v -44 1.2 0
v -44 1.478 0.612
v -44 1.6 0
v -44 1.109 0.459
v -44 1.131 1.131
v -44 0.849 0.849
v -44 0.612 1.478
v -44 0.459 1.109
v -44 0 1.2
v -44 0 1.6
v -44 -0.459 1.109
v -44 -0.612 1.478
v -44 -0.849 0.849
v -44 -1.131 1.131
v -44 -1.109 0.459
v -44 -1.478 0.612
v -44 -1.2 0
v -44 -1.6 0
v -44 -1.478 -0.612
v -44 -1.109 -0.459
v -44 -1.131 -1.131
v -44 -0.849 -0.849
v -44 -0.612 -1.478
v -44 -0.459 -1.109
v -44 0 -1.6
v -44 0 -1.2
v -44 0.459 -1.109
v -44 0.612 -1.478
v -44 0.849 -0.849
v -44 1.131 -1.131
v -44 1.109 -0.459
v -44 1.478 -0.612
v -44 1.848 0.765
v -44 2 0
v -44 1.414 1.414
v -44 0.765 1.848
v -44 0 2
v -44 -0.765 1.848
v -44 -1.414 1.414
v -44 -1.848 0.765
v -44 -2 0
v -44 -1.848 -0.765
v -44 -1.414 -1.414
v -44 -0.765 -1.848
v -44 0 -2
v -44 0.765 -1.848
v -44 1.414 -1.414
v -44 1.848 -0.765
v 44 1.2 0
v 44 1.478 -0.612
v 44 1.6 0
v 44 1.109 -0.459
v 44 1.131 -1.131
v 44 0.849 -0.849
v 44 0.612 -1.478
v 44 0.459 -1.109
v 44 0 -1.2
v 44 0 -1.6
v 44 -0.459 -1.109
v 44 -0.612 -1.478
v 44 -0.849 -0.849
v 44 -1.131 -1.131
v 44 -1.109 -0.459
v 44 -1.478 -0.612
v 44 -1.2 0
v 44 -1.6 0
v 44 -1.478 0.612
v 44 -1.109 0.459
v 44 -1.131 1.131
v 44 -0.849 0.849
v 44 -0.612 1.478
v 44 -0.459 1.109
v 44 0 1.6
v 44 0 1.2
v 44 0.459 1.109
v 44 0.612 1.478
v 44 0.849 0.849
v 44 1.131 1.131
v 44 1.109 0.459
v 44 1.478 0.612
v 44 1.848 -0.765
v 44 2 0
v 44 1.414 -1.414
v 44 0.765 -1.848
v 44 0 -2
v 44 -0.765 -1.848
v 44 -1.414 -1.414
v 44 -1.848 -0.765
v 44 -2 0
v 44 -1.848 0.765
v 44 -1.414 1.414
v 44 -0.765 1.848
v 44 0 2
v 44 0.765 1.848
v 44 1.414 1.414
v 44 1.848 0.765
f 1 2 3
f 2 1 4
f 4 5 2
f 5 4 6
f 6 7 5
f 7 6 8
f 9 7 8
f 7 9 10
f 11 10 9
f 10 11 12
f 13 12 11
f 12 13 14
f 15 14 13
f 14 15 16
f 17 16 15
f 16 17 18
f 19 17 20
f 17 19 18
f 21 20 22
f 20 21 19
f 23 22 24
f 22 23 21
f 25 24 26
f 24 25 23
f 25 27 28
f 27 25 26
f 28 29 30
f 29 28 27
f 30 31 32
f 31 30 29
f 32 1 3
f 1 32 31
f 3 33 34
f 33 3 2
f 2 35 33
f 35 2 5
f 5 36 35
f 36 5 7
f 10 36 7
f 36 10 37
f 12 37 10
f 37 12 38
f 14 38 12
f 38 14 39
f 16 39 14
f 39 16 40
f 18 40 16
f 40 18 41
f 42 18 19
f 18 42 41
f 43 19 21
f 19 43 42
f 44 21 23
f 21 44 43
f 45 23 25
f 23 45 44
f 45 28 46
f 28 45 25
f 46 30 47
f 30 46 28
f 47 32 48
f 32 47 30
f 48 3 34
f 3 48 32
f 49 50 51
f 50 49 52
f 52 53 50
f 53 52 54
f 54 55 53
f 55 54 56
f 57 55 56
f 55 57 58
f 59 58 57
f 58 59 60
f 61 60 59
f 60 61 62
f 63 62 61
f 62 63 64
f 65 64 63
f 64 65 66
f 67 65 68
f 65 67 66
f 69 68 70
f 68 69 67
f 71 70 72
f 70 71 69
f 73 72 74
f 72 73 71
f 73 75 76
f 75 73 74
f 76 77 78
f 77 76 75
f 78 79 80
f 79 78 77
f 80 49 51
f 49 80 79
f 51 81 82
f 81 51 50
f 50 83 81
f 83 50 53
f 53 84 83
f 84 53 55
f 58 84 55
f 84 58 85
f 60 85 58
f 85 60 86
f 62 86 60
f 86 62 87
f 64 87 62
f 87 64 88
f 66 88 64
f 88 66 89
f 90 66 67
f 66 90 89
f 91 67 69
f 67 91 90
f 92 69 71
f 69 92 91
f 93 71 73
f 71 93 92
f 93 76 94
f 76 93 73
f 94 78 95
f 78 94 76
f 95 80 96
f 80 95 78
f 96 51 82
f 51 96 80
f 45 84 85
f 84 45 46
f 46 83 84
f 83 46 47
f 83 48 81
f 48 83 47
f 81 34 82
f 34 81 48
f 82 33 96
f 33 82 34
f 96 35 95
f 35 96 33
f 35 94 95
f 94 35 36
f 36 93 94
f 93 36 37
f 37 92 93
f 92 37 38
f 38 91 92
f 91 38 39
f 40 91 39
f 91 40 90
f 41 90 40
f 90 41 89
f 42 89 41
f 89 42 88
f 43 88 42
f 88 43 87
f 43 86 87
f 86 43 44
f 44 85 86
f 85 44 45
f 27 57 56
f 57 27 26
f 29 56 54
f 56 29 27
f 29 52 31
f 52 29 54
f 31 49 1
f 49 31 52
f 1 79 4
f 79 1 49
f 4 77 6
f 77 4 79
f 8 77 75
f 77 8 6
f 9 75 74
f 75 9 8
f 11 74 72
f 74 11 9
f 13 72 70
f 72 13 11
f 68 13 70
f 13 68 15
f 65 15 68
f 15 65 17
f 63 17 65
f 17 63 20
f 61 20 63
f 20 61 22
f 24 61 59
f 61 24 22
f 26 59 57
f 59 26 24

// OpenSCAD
// file: ../p/4-4cyli.scad
use <../lib.scad>
function ldraw_lib__4_4cyli() = [
// 0 Cylinder 1.0
// 0 Name: 4-4cyli.dat
// 0 Author: James Jessiman
// 0 !LDRAW_ORG Primitive UPDATE 2005-01
// 0 !LICENSE Licensed under CC BY 4.0 : see CAreadme.txt
// 
// 0 BFC CERTIFY CCW
  [0,"BFC","CERTIFY"],
  [0,"BFC","CCW"],
// 
// 0 !HISTORY 1998-12-15 [PTadmin] Official Update 1998-10
// 0 !HISTORY 2002-03-23 [sbliss] Added BFC statement; merged headers from files in distributions LDraw 0.27 and Complete.
// 0 !HISTORY 2002-04-25 [PTadmin] Official Update 2002-02
// 0 !HISTORY 2004-12-14 [guyvivan] BFC CCW
// 0 !HISTORY 2005-12-28 [PTadmin] Official Update 2005-01
// 0 !HISTORY 2007-06-24 [PTadmin] Header formatted for Contributor Agreement
// 0 !HISTORY 2008-07-01 [PTadmin] Official Update 2008-01
// 
// 
// 4 16 1 1 0 0.9239 1 0.3827 0.9239 0 0.3827 1 0 0
  [4,16,1,1,0,0.9239,1,0.3827,0.9239,0,0.3827,1,0,0],
// 5 24 1 0 0 1 1 0 0.9239 0 0.3827 0.9239 0 -0.3827
  [5,24,1,0,0,1,1,0,0.9239,0,0.3827,0.9239,0,-0.3827],
// 4 16 0.9239 1 0.3827 0.7071 1 0.7071 0.7071 0 0.7071 0.9239 0 0.3827
  [4,16,0.9239,1,0.3827,0.7071,1,0.7071,0.7071,0,0.7071,0.9239,0,0.3827],
// 5 24 0.9239 0 0.3827 0.9239 1 0.3827 0.7071 0 0.7071 1 0 0
  [5,24,0.9239,0,0.3827,0.9239,1,0.3827,0.7071,0,0.7071,1,0,0],
// 4 16 0.7071 1 0.7071 0.3827 1 0.9239 0.3827 0 0.9239 0.7071 0 0.7071
  [4,16,0.7071,1,0.7071,0.3827,1,0.9239,0.3827,0,0.9239,0.7071,0,0.7071],
// 5 24 0.7071 0 0.7071 0.7071 1 0.7071 0.3827 0 0.9239 0.9239 0 0.3827
  [5,24,0.7071,0,0.7071,0.7071,1,0.7071,0.3827,0,0.9239,0.9239,0,0.3827],
// 4 16 0.3827 1 0.9239 0 1 1 0 0 1 0.3827 0 0.9239
  [4,16,0.3827,1,0.9239,0,1,1,0,0,1,0.3827,0,0.9239],
// 5 24 0.3827 0 0.9239 0.3827 1 0.9239 0 0 1 0.7071 0 0.7071
  [5,24,0.3827,0,0.9239,0.3827,1,0.9239,0,0,1,0.7071,0,0.7071],
// 4 16 0 1 1 -0.3827 1 0.9239 -0.3827 0 0.9239 0 0 1
  [4,16,0,1,1,-0.3827,1,0.9239,-0.3827,0,0.9239,0,0,1],
// 5 24 0 0 1 0 1 1 -0.3827 0 0.9239 0.3827 0 0.9239
  [5,24,0,0,1,0,1,1,-0.3827,0,0.9239,0.3827,0,0.9239],
// 4 16 -0.3827 1 0.9239 -0.7071 1 0.7071 -0.7071 0 0.7071 -0.3827 0 0.9239
  [4,16,-0.3827,1,0.9239,-0.7071,1,0.7071,-0.7071,0,0.7071,-0.3827,0,0.9239],
// 5 24 -0.3827 0 0.9239 -0.3827 1 0.9239 -0.7071 0 0.7071 0 0 1
  [5,24,-0.3827,0,0.9239,-0.3827,1,0.9239,-0.7071,0,0.7071,0,0,1],
// 4 16 -0.7071 1 0.7071 -0.9239 1 0.3827 -0.9239 0 0.3827 -0.7071 0 0.7071
  [4,16,-0.7071,1,0.7071,-0.9239,1,0.3827,-0.9239,0,0.3827,-0.7071,0,0.7071],
// 5 24 -0.7071 0 0.7071 -0.7071 1 0.7071 -0.9239 0 0.3827 -0.3827 0 0.9239
  [5,24,-0.7071,0,0.7071,-0.7071,1,0.7071,-0.9239,0,0.3827,-0.3827,0,0.9239],
// 4 16 -0.9239 1 0.3827 -1 1 0 -1 0 0 -0.9239 0 0.3827
  [4,16,-0.9239,1,0.3827,-1,1,0,-1,0,0,-0.9239,0,0.3827],
// 5 24 -0.9239 0 0.3827 -0.9239 1 0.3827 -1 0 0 -0.7071 0 0.7071
  [5,24,-0.9239,0,0.3827,-0.9239,1,0.3827,-1,0,0,-0.7071,0,0.7071],
// 4 16 -1 1 0 -0.9239 1 -0.3827 -0.9239 0 -0.3827 -1 0 0
  [4,16,-1,1,0,-0.9239,1,-0.3827,-0.9239,0,-0.3827,-1,0,0],
// 5 24 -1 0 0 -1 1 0 -0.9239 0 -0.3827 -0.9239 0 0.3827
  [5,24,-1,0,0,-1,1,0,-0.9239,0,-0.3827,-0.9239,0,0.3827],
// 4 16 -0.9239 1 -0.3827 -0.7071 1 -0.7071 -0.7071 0 -0.7071 -0.9239 0 -0.3827
  [4,16,-0.9239,1,-0.3827,-0.7071,1,-0.7071,-0.7071,0,-0.7071,-0.9239,0,-0.3827],
// 5 24 -0.9239 0 -0.3827 -0.9239 1 -0.3827 -0.7071 0 -0.7071 -1 0 0
  [5,24,-0.9239,0,-0.3827,-0.9239,1,-0.3827,-0.7071,0,-0.7071,-1,0,0],
// 4 16 -0.7071 1 -0.7071 -0.3827 1 -0.9239 -0.3827 0 -0.9239 -0.7071 0 -0.7071
  [4,16,-0.7071,1,-0.7071,-0.3827,1,-0.9239,-0.3827,0,-0.9239,-0.7071,0,-0.7071],
// 5 24 -0.7071 0 -0.7071 -0.7071 1 -0.7071 -0.3827 0 -0.9239 -0.9239 0 -0.3827
  [5,24,-0.7071,0,-0.7071,-0.7071,1,-0.7071,-0.3827,0,-0.9239,-0.9239,0,-0.3827],
// 4 16 -0.3827 1 -0.9239 0 1 -1 0 0 -1 -0.3827 0 -0.9239
  [4,16,-0.3827,1,-0.9239,0,1,-1,0,0,-1,-0.3827,0,-0.9239],
// 5 24 -0.3827 0 -0.9239 -0.3827 1 -0.9239 0 0 -1 -0.7071 0 -0.7071
  [5,24,-0.3827,0,-0.9239,-0.3827,1,-0.9239,0,0,-1,-0.7071,0,-0.7071],
// 4 16 0 1 -1 0.3827 1 -0.9239 0.3827 0 -0.9239 0 0 -1
  [4,16,0,1,-1,0.3827,1,-0.9239,0.3827,0,-0.9239,0,0,-1],
// 5 24 0 0 -1 0 1 -1 0.3827 0 -0.9239 -0.3827 0 -0.9239
  [5,24,0,0,-1,0,1,-1,0.3827,0,-0.9239,-0.3827,0,-0.9239],
// 4 16 0.3827 1 -0.9239 0.7071 1 -0.7071 0.7071 0 -0.7071 0.3827 0 -0.9239
  [4,16,0.3827,1,-0.9239,0.7071,1,-0.7071,0.7071,0,-0.7071,0.3827,0,-0.9239],
// 5 24 0.3827 0 -0.9239 0.3827 1 -0.9239 0.7071 0 -0.7071 0 0 -1
  [5,24,0.3827,0,-0.9239,0.3827,1,-0.9239,0.7071,0,-0.7071,0,0,-1],
// 4 16 0.7071 1 -0.7071 0.9239 1 -0.3827 0.9239 0 -0.3827 0.7071 0 -0.7071
  [4,16,0.7071,1,-0.7071,0.9239,1,-0.3827,0.9239,0,-0.3827,0.7071,0,-0.7071],
// 5 24 0.7071 0 -0.7071 0.7071 1 -0.7071 0.9239 0 -0.3827 0.3827 0 -0.9239
  [5,24,0.7071,0,-0.7071,0.7071,1,-0.7071,0.9239,0,-0.3827,0.3827,0,-0.9239],
// 4 16 0.9239 1 -0.3827 1 1 0 1 0 0 0.9239 0 -0.3827
  [4,16,0.9239,1,-0.3827,1,1,0,1,0,0,0.9239,0,-0.3827],
// 5 24 0.9239 0 -0.3827 0.9239 1 -0.3827 1 0 0 0.7071 0 -0.7071
  [5,24,0.9239,0,-0.3827,0.9239,1,-0.3827,1,0,0,0.7071,0,-0.7071],
// 0
];
module ldraw_lib__4_4cyli(step=0, col=false, unit=2/5, alt=false, line=0.2, solid=!$preview)
    makepoly(ldraw_lib__4_4cyli(), step=step, col=col, unit=unit, alt=alt, line=line, solid=solid);
ldraw_lib__4_4cyli(line=0.2);
// file: ../p/4-4ring4.scad
use <../lib.scad>
function ldraw_lib__4_4ring4() = [
// 0 Ring  4 x 1.0
// 0 Name: 4-4ring4.dat
// 0 Author: James Jessiman
// 0 !LDRAW_ORG Primitive UPDATE 2009-01
// 0 !LICENSE Licensed under CC BY 4.0 : see CAreadme.txt
// 
// 0 BFC CERTIFY CCW
  [0,"BFC","CERTIFY"],
  [0,"BFC","CCW"],
// 
// 0 !HISTORY 1998-12-15 [PTadmin] Official Update 1998-10
// 0 !HISTORY 2002-04-08 [BrickCaster] Modified for BFC compliance
// 0 !HISTORY 2002-04-25 [PTadmin] Official Update 2002-02
// 0 !HISTORY 2007-06-24 [PTadmin] Header formatted for Contributor Agreement
// 0 !HISTORY 2008-07-01 [PTadmin] Official Update 2008-01
// 0 !HISTORY 2008-08-26 [cwdee] Switch polygon winding and rename
// 0 !HISTORY 2009-05-02 [PTadmin] Official Update 2009-01
// 
// 
// 4 16 -1.9135 0 4.6195 -1.5308 0 3.6956 0 0 4 0 0 5
  [4,16,-1.9135,0,4.6195,-1.5308,0,3.6956,0,0,4,0,0,5],
// 4 16 -3.5355 0 3.5355 -2.8284 0 2.8284 -1.5308 0 3.6956 -1.9135 0 4.6195
  [4,16,-3.5355,0,3.5355,-2.8284,0,2.8284,-1.5308,0,3.6956,-1.9135,0,4.6195],
// 4 16 -4.6195 0 1.9135 -3.6956 0 1.5308 -2.8284 0 2.8284 -3.5355 0 3.5355
  [4,16,-4.6195,0,1.9135,-3.6956,0,1.5308,-2.8284,0,2.8284,-3.5355,0,3.5355],
// 4 16 -5 0 0 -4 0 0 -3.6956 0 1.5308 -4.6195 0 1.9135
  [4,16,-5,0,0,-4,0,0,-3.6956,0,1.5308,-4.6195,0,1.9135],
// 4 16 -4.6195 0 -1.9135 -3.6956 0 -1.5308 -4 0 0 -5 0 0
  [4,16,-4.6195,0,-1.9135,-3.6956,0,-1.5308,-4,0,0,-5,0,0],
// 4 16 -3.5355 0 -3.5355 -2.8284 0 -2.8284 -3.6956 0 -1.5308 -4.6195 0 -1.9135
  [4,16,-3.5355,0,-3.5355,-2.8284,0,-2.8284,-3.6956,0,-1.5308,-4.6195,0,-1.9135],
// 4 16 -1.9135 0 -4.6195 -1.5308 0 -3.6956 -2.8284 0 -2.8284 -3.5355 0 -3.5355
  [4,16,-1.9135,0,-4.6195,-1.5308,0,-3.6956,-2.8284,0,-2.8284,-3.5355,0,-3.5355],
// 4 16 0 0 -5 0 0 -4 -1.5308 0 -3.6956 -1.9135 0 -4.6195
  [4,16,0,0,-5,0,0,-4,-1.5308,0,-3.6956,-1.9135,0,-4.6195],
// 4 16 1.9135 0 -4.6195 1.5308 0 -3.6956 0 0 -4 0 0 -5
  [4,16,1.9135,0,-4.6195,1.5308,0,-3.6956,0,0,-4,0,0,-5],
// 4 16 3.5355 0 -3.5355 2.8284 0 -2.8284 1.5308 0 -3.6956 1.9135 0 -4.6195
  [4,16,3.5355,0,-3.5355,2.8284,0,-2.8284,1.5308,0,-3.6956,1.9135,0,-4.6195],
// 4 16 4.6195 0 -1.9135 3.6956 0 -1.5308 2.8284 0 -2.8284 3.5355 0 -3.5355
  [4,16,4.6195,0,-1.9135,3.6956,0,-1.5308,2.8284,0,-2.8284,3.5355,0,-3.5355],
// 4 16 5 0 0 4 0 0 3.6956 0 -1.5308 4.6195 0 -1.9135
  [4,16,5,0,0,4,0,0,3.6956,0,-1.5308,4.6195,0,-1.9135],
// 4 16 4.6195 0 1.9135 3.6956 0 1.5308 4 0 0 5 0 0
  [4,16,4.6195,0,1.9135,3.6956,0,1.5308,4,0,0,5,0,0],
// 4 16 3.5355 0 3.5355 2.8284 0 2.8284 3.6956 0 1.5308 4.6195 0 1.9135
  [4,16,3.5355,0,3.5355,2.8284,0,2.8284,3.6956,0,1.5308,4.6195,0,1.9135],
// 4 16 1.9135 0 4.6195 1.5308 0 3.6956 2.8284 0 2.8284 3.5355 0 3.5355
  [4,16,1.9135,0,4.6195,1.5308,0,3.6956,2.8284,0,2.8284,3.5355,0,3.5355],
// 4 16 0 0 5 0 0 4 1.5308 0 3.6956 1.9135 0 4.6195
  [4,16,0,0,5,0,0,4,1.5308,0,3.6956,1.9135,0,4.6195],
// 0
];
module ldraw_lib__4_4ring4(step=0, col=false, unit=2/5, alt=false, line=0.2, solid=!$preview)
    makepoly(ldraw_lib__4_4ring4(), step=step, col=col, unit=unit, alt=alt, line=line, solid=solid);
ldraw_lib__4_4ring4(line=0.2);
// file: ../p/4-4ring3.scad
use <../lib.scad>
function ldraw_lib__4_4ring3() = [
// 0 Ring  3 x 1.0
// 0 Name: 4-4ring3.dat
// 0 Author: James Jessiman
// 0 !LDRAW_ORG Primitive UPDATE 2009-01
// 0 !LICENSE Licensed under CC BY 4.0 : see CAreadme.txt
// 
// 0 BFC CERTIFY CCW
  [0,"BFC","CERTIFY"],
  [0,"BFC","CCW"],
// 
// 0 !HISTORY 1998-12-15 [PTadmin] Official Update 1998-10
// 0 !HISTORY 2002-04-05 [hafhead] Added BFC statement
// 0 !HISTORY 2002-04-25 [PTadmin] Official Update 2002-02
// 0 !HISTORY 2007-06-24 [PTadmin] Header formatted for Contributor Agreement
// 0 !HISTORY 2008-07-01 [PTadmin] Official Update 2008-01
// 0 !HISTORY 2008-08-26 [cwdee] Switch polygon winding and rename
// 0 !HISTORY 2009-05-02 [PTadmin] Official Update 2009-01
// 
// 
// 4 16 -1.5308 0 3.6956 -1.1481 0 2.7717 0 0 3 0 0 4
  [4,16,-1.5308,0,3.6956,-1.1481,0,2.7717,0,0,3,0,0,4],
// 4 16 -2.8284 0 2.8284 -2.1213 0 2.1213 -1.1481 0 2.7717 -1.5308 0 3.6956
  [4,16,-2.8284,0,2.8284,-2.1213,0,2.1213,-1.1481,0,2.7717,-1.5308,0,3.6956],
// 4 16 -3.6956 0 1.5308 -2.7717 0 1.1481 -2.1213 0 2.1213 -2.8284 0 2.8284
  [4,16,-3.6956,0,1.5308,-2.7717,0,1.1481,-2.1213,0,2.1213,-2.8284,0,2.8284],
// 4 16 -4 0 0 -3 0 0 -2.7717 0 1.1481 -3.6956 0 1.5308
  [4,16,-4,0,0,-3,0,0,-2.7717,0,1.1481,-3.6956,0,1.5308],
// 4 16 -3.6956 0 -1.5308 -2.7717 0 -1.1481 -3 0 0 -4 0 0
  [4,16,-3.6956,0,-1.5308,-2.7717,0,-1.1481,-3,0,0,-4,0,0],
// 4 16 -2.8284 0 -2.8284 -2.1213 0 -2.1213 -2.7717 0 -1.1481 -3.6956 0 -1.5308
  [4,16,-2.8284,0,-2.8284,-2.1213,0,-2.1213,-2.7717,0,-1.1481,-3.6956,0,-1.5308],
// 4 16 -1.5308 0 -3.6956 -1.1481 0 -2.7717 -2.1213 0 -2.1213 -2.8284 0 -2.8284
  [4,16,-1.5308,0,-3.6956,-1.1481,0,-2.7717,-2.1213,0,-2.1213,-2.8284,0,-2.8284],
// 4 16 0 0 -4 0 0 -3 -1.1481 0 -2.7717 -1.5308 0 -3.6956
  [4,16,0,0,-4,0,0,-3,-1.1481,0,-2.7717,-1.5308,0,-3.6956],
// 4 16 1.5308 0 -3.6956 1.1481 0 -2.7717 0 0 -3 0 0 -4
  [4,16,1.5308,0,-3.6956,1.1481,0,-2.7717,0,0,-3,0,0,-4],
// 4 16 2.8284 0 -2.8284 2.1213 0 -2.1213 1.1481 0 -2.7717 1.5308 0 -3.6956
  [4,16,2.8284,0,-2.8284,2.1213,0,-2.1213,1.1481,0,-2.7717,1.5308,0,-3.6956],
// 4 16 3.6956 0 -1.5308 2.7717 0 -1.1481 2.1213 0 -2.1213 2.8284 0 -2.8284
  [4,16,3.6956,0,-1.5308,2.7717,0,-1.1481,2.1213,0,-2.1213,2.8284,0,-2.8284],
// 4 16 4 0 0 3 0 0 2.7717 0 -1.1481 3.6956 0 -1.5308
  [4,16,4,0,0,3,0,0,2.7717,0,-1.1481,3.6956,0,-1.5308],
// 4 16 3.6956 0 1.5308 2.7717 0 1.1481 3 0 0 4 0 0
  [4,16,3.6956,0,1.5308,2.7717,0,1.1481,3,0,0,4,0,0],
// 4 16 2.8284 0 2.8284 2.1213 0 2.1213 2.7717 0 1.1481 3.6956 0 1.5308
  [4,16,2.8284,0,2.8284,2.1213,0,2.1213,2.7717,0,1.1481,3.6956,0,1.5308],
// 4 16 1.5308 0 3.6956 1.1481 0 2.7717 2.1213 0 2.1213 2.8284 0 2.8284
  [4,16,1.5308,0,3.6956,1.1481,0,2.7717,2.1213,0,2.1213,2.8284,0,2.8284],
// 4 16 0 0 4 0 0 3 1.1481 0 2.7717 1.5308 0 3.6956
  [4,16,0,0,4,0,0,3,1.1481,0,2.7717,1.5308,0,3.6956],
// 0
];
module ldraw_lib__4_4ring3(step=0, col=false, unit=2/5, alt=false, line=0.2, solid=!$preview)
    makepoly(ldraw_lib__4_4ring3(), step=step, col=col, unit=unit, alt=alt, line=line, solid=solid);
ldraw_lib__4_4ring3(line=0.2);
// file: ../p/4-4edge.scad
use <../lib.scad>
function ldraw_lib__4_4edge() = [
// 0 Circle 1.0
// 0 Name: 4-4edge.dat
// 0 Author: James Jessiman
// 0 !LDRAW_ORG Primitive UPDATE 2017-01
// 0 !LICENSE Licensed under CC BY 4.0 : see CAreadme.txt
// 
// 0 BFC CERTIFY CCW
  [0,"BFC","CERTIFY"],
  [0,"BFC","CCW"],
// 
// 0 !HISTORY 1998-12-15 [PTadmin] Official Update 1998-10
// 0 !HISTORY 2005-12-28 [PTadmin] Official Update 2005-01
// 0 !HISTORY 2007-06-24 [PTadmin] Header formatted for Contributor Agreement
// 0 !HISTORY 2008-07-01 [PTadmin] Official Update 2008-01
// 0 !HISTORY 2017-01-15 [Steffen] BFCed
// 0 !HISTORY 2017-12-30 [PTadmin] Official Update 2017-01
// 
// 
// 2 24 1 0 0 0.9239 0 0.3827
  [2,24,1,0,0,0.9239,0,0.3827],
// 2 24 0.9239 0 0.3827 0.7071 0 0.7071
  [2,24,0.9239,0,0.3827,0.7071,0,0.7071],
// 2 24 0.7071 0 0.7071 0.3827 0 0.9239
  [2,24,0.7071,0,0.7071,0.3827,0,0.9239],
// 2 24 0.3827 0 0.9239 0 0 1
  [2,24,0.3827,0,0.9239,0,0,1],
// 2 24 0 0 1 -0.3827 0 0.9239
  [2,24,0,0,1,-0.3827,0,0.9239],
// 2 24 -0.3827 0 0.9239 -0.7071 0 0.7071
  [2,24,-0.3827,0,0.9239,-0.7071,0,0.7071],
// 2 24 -0.7071 0 0.7071 -0.9239 0 0.3827
  [2,24,-0.7071,0,0.7071,-0.9239,0,0.3827],
// 2 24 -0.9239 0 0.3827 -1 0 -0
  [2,24,-0.9239,0,0.3827,-1,0,-0],
// 2 24 -1 0 -0 -0.9239 0 -0.3827
  [2,24,-1,0,-0,-0.9239,0,-0.3827],
// 2 24 -0.9239 0 -0.3827 -0.7071 0 -0.7071
  [2,24,-0.9239,0,-0.3827,-0.7071,0,-0.7071],
// 2 24 -0.7071 0 -0.7071 -0.3827 0 -0.9239
  [2,24,-0.7071,0,-0.7071,-0.3827,0,-0.9239],
// 2 24 -0.3827 0 -0.9239 0 0 -1
  [2,24,-0.3827,0,-0.9239,0,0,-1],
// 2 24 0 0 -1 0.3827 0 -0.9239
  [2,24,0,0,-1,0.3827,0,-0.9239],
// 2 24 0.3827 0 -0.9239 0.7071 0 -0.7071
  [2,24,0.3827,0,-0.9239,0.7071,0,-0.7071],
// 2 24 0.7071 0 -0.7071 0.9239 0 -0.3827
  [2,24,0.7071,0,-0.7071,0.9239,0,-0.3827],
// 2 24 0.9239 0 -0.3827 1 0 0
  [2,24,0.9239,0,-0.3827,1,0,0],
];
module ldraw_lib__4_4edge(step=0, col=false, unit=2/5, alt=false, line=0.2, solid=!$preview)
    makepoly(ldraw_lib__4_4edge(), step=step, col=col, unit=unit, alt=alt, line=line, solid=solid);
ldraw_lib__4_4edge(line=0.2);
// file: 71533k03.scad
use <../lib.scad>
use <../p/4-4cyli.scad>
function ldraw_lib__71533k03() = [
// 0 ~Technic Pneumatic Tube Segment
// 0 Name: 71533k03.dat
// 0 Author: Jaco van der Molen [Jaco]
// 0 !LDRAW_ORG Part Flexible_Section UPDATE 2020-01
// 0 !LICENSE Licensed under CC BY 4.0 : see CAreadme.txt
// 
// 0 BFC CERTIFY CW
  [0,"BFC","CERTIFY"],
  [0,"BFC","CW"],
// 
// 0 !HISTORY 2003-11-30 [Steffen] BFCed
// 0 !HISTORY 2009-12-29 [PTadmin] Official Update 2009-03
// 0 !HISTORY 2020-06-27 [PTadmin] Renamed from 166
// 0 !HISTORY 2020-06-28 [PTadmin] Official Update 2020-01
// 
// 
// 1 16 0 0 0 5 0 0 0 1 0 0 0 5 4-4cyli.dat
  [1,16,0,0,0,5,0,0,0,1,0,0,0,5, ldraw_lib__4_4cyli()],
// 0 BFC INVERTNEXT
  [0,"BFC","INVERTNEXT"],
// 1 16 0 0 0 3 0 0 0 1 0 0 0 3 4-4cyli.dat
  [1,16,0,0,0,3,0,0,0,1,0,0,0,3, ldraw_lib__4_4cyli()],
// 0
];
module ldraw_lib__71533k03(step=0, col=false, unit=2/5, alt=false, line=0.2, solid=!$preview)
    makepoly(ldraw_lib__71533k03(), step=step, col=col, unit=unit, alt=alt, line=line, solid=solid);
ldraw_lib__71533k03(line=0.2);
// file: 71533k02.scad
use <../lib.scad>
use <../p/4-4edge.scad>
use <../p/4-4ring3.scad>
use <../p/4-4ring4.scad>
function ldraw_lib__71533k02() = [
// 0 ~Technic Pneumatic Tube End (Non-Bulged)
// 0 Name: 71533k02.dat
// 0 Author: Steffen [Steffen]
// 0 !LDRAW_ORG Part Flexible_Section UPDATE 2020-01
// 0 !LICENSE Licensed under CC BY 4.0 : see CAreadme.txt
// 
// 0 BFC CERTIFY CCW
  [0,"BFC","CERTIFY"],
  [0,"BFC","CCW"],
// 
// 0 !HISTORY 2020-06-28 [PTadmin] Official Update 2020-01
// 
// 
// 0 // This file goes together with 71533k01.dat and 71533k03.dat.
// 0 // Those 3 files can be used to create Technic Pneumatic Tubes
// 0 // with either bulged or non-bulged ends.
// 
// 1 16 0 0 0 1 0 0 0 1 0 0 0 1 4-4ring3.dat
  [1,16,0,0,0,1,0,0,0,1,0,0,0,1, ldraw_lib__4_4ring3()],
// 1 16 0 0 0 1 0 0 0 1 0 0 0 1 4-4ring4.dat
  [1,16,0,0,0,1,0,0,0,1,0,0,0,1, ldraw_lib__4_4ring4()],
// 1 16 0 0 0 3 0 0 0 3 0 0 0 3 4-4edge.dat
  [1,16,0,0,0,3,0,0,0,3,0,0,0,3, ldraw_lib__4_4edge()],
// 1 16 0 0 0 5 0 0 0 5 0 0 0 5 4-4edge.dat
  [1,16,0,0,0,5,0,0,0,5,0,0,0,5, ldraw_lib__4_4edge()],
];
module ldraw_lib__71533k02(step=0, col=false, unit=2/5, alt=false, line=0.2, solid=!$preview)
    makepoly(ldraw_lib__71533k02(), step=step, col=col, unit=unit, alt=alt, line=line, solid=solid);
ldraw_lib__71533k02(line=0.2);
// main file
use <../lib.scad>
use <71533k02.scad>
use <71533k03.scad>
function ldraw_lib__103671_f1() = [
// 0 Technic Pneumatic Tube 11L
// 0 Name: 103671-f1.dat
// 0 Author: Philippe Hurbain [Philo]
// 0 !LDRAW_ORG Part UPDATE 2025-05
// 0 !LICENSE Licensed under CC BY 4.0 : see CAreadme.txt
// 
// 0 BFC CERTIFY CCW
  [0,"BFC","CERTIFY"],
  [0,"BFC","CCW"],
// 
// 0 !KEYWORDS 88 mm, BrickLink 103671, Rebrickable 5102c11
// 
// 0 !HISTORY 2025-05-28 [OrionP] Official Update 2025-05
// 
// 1 16 -110 0 0 0 1 0 1 0 0 0 0 1 71533k02.dat
  [1,16,-110,0,0,0,1,0,1,0,0,0,0,1, ldraw_lib__71533k02()],
// 1 16 110 0 0 0 -1 0 -1 0 0 0 0 1 71533k02.dat
  [1,16,110,0,0,0,-1,0,-1,0,0,0,0,1, ldraw_lib__71533k02()],
// 1 16 -110 0 0 0 220 0 1 0 0 0 0 1 71533k03.dat
  [1,16,-110,0,0,0,220,0,1,0,0,0,0,1, ldraw_lib__71533k03()],
];
module ldraw_lib__103671_f1(step=0, col=false, unit=2/5, alt=false, line=0.2, solid=!$preview)
    makepoly(ldraw_lib__103671_f1(), step=step, col=col, unit=unit, alt=alt, line=line, solid=solid);
ldraw_lib__103671_f1(line=0.2);
